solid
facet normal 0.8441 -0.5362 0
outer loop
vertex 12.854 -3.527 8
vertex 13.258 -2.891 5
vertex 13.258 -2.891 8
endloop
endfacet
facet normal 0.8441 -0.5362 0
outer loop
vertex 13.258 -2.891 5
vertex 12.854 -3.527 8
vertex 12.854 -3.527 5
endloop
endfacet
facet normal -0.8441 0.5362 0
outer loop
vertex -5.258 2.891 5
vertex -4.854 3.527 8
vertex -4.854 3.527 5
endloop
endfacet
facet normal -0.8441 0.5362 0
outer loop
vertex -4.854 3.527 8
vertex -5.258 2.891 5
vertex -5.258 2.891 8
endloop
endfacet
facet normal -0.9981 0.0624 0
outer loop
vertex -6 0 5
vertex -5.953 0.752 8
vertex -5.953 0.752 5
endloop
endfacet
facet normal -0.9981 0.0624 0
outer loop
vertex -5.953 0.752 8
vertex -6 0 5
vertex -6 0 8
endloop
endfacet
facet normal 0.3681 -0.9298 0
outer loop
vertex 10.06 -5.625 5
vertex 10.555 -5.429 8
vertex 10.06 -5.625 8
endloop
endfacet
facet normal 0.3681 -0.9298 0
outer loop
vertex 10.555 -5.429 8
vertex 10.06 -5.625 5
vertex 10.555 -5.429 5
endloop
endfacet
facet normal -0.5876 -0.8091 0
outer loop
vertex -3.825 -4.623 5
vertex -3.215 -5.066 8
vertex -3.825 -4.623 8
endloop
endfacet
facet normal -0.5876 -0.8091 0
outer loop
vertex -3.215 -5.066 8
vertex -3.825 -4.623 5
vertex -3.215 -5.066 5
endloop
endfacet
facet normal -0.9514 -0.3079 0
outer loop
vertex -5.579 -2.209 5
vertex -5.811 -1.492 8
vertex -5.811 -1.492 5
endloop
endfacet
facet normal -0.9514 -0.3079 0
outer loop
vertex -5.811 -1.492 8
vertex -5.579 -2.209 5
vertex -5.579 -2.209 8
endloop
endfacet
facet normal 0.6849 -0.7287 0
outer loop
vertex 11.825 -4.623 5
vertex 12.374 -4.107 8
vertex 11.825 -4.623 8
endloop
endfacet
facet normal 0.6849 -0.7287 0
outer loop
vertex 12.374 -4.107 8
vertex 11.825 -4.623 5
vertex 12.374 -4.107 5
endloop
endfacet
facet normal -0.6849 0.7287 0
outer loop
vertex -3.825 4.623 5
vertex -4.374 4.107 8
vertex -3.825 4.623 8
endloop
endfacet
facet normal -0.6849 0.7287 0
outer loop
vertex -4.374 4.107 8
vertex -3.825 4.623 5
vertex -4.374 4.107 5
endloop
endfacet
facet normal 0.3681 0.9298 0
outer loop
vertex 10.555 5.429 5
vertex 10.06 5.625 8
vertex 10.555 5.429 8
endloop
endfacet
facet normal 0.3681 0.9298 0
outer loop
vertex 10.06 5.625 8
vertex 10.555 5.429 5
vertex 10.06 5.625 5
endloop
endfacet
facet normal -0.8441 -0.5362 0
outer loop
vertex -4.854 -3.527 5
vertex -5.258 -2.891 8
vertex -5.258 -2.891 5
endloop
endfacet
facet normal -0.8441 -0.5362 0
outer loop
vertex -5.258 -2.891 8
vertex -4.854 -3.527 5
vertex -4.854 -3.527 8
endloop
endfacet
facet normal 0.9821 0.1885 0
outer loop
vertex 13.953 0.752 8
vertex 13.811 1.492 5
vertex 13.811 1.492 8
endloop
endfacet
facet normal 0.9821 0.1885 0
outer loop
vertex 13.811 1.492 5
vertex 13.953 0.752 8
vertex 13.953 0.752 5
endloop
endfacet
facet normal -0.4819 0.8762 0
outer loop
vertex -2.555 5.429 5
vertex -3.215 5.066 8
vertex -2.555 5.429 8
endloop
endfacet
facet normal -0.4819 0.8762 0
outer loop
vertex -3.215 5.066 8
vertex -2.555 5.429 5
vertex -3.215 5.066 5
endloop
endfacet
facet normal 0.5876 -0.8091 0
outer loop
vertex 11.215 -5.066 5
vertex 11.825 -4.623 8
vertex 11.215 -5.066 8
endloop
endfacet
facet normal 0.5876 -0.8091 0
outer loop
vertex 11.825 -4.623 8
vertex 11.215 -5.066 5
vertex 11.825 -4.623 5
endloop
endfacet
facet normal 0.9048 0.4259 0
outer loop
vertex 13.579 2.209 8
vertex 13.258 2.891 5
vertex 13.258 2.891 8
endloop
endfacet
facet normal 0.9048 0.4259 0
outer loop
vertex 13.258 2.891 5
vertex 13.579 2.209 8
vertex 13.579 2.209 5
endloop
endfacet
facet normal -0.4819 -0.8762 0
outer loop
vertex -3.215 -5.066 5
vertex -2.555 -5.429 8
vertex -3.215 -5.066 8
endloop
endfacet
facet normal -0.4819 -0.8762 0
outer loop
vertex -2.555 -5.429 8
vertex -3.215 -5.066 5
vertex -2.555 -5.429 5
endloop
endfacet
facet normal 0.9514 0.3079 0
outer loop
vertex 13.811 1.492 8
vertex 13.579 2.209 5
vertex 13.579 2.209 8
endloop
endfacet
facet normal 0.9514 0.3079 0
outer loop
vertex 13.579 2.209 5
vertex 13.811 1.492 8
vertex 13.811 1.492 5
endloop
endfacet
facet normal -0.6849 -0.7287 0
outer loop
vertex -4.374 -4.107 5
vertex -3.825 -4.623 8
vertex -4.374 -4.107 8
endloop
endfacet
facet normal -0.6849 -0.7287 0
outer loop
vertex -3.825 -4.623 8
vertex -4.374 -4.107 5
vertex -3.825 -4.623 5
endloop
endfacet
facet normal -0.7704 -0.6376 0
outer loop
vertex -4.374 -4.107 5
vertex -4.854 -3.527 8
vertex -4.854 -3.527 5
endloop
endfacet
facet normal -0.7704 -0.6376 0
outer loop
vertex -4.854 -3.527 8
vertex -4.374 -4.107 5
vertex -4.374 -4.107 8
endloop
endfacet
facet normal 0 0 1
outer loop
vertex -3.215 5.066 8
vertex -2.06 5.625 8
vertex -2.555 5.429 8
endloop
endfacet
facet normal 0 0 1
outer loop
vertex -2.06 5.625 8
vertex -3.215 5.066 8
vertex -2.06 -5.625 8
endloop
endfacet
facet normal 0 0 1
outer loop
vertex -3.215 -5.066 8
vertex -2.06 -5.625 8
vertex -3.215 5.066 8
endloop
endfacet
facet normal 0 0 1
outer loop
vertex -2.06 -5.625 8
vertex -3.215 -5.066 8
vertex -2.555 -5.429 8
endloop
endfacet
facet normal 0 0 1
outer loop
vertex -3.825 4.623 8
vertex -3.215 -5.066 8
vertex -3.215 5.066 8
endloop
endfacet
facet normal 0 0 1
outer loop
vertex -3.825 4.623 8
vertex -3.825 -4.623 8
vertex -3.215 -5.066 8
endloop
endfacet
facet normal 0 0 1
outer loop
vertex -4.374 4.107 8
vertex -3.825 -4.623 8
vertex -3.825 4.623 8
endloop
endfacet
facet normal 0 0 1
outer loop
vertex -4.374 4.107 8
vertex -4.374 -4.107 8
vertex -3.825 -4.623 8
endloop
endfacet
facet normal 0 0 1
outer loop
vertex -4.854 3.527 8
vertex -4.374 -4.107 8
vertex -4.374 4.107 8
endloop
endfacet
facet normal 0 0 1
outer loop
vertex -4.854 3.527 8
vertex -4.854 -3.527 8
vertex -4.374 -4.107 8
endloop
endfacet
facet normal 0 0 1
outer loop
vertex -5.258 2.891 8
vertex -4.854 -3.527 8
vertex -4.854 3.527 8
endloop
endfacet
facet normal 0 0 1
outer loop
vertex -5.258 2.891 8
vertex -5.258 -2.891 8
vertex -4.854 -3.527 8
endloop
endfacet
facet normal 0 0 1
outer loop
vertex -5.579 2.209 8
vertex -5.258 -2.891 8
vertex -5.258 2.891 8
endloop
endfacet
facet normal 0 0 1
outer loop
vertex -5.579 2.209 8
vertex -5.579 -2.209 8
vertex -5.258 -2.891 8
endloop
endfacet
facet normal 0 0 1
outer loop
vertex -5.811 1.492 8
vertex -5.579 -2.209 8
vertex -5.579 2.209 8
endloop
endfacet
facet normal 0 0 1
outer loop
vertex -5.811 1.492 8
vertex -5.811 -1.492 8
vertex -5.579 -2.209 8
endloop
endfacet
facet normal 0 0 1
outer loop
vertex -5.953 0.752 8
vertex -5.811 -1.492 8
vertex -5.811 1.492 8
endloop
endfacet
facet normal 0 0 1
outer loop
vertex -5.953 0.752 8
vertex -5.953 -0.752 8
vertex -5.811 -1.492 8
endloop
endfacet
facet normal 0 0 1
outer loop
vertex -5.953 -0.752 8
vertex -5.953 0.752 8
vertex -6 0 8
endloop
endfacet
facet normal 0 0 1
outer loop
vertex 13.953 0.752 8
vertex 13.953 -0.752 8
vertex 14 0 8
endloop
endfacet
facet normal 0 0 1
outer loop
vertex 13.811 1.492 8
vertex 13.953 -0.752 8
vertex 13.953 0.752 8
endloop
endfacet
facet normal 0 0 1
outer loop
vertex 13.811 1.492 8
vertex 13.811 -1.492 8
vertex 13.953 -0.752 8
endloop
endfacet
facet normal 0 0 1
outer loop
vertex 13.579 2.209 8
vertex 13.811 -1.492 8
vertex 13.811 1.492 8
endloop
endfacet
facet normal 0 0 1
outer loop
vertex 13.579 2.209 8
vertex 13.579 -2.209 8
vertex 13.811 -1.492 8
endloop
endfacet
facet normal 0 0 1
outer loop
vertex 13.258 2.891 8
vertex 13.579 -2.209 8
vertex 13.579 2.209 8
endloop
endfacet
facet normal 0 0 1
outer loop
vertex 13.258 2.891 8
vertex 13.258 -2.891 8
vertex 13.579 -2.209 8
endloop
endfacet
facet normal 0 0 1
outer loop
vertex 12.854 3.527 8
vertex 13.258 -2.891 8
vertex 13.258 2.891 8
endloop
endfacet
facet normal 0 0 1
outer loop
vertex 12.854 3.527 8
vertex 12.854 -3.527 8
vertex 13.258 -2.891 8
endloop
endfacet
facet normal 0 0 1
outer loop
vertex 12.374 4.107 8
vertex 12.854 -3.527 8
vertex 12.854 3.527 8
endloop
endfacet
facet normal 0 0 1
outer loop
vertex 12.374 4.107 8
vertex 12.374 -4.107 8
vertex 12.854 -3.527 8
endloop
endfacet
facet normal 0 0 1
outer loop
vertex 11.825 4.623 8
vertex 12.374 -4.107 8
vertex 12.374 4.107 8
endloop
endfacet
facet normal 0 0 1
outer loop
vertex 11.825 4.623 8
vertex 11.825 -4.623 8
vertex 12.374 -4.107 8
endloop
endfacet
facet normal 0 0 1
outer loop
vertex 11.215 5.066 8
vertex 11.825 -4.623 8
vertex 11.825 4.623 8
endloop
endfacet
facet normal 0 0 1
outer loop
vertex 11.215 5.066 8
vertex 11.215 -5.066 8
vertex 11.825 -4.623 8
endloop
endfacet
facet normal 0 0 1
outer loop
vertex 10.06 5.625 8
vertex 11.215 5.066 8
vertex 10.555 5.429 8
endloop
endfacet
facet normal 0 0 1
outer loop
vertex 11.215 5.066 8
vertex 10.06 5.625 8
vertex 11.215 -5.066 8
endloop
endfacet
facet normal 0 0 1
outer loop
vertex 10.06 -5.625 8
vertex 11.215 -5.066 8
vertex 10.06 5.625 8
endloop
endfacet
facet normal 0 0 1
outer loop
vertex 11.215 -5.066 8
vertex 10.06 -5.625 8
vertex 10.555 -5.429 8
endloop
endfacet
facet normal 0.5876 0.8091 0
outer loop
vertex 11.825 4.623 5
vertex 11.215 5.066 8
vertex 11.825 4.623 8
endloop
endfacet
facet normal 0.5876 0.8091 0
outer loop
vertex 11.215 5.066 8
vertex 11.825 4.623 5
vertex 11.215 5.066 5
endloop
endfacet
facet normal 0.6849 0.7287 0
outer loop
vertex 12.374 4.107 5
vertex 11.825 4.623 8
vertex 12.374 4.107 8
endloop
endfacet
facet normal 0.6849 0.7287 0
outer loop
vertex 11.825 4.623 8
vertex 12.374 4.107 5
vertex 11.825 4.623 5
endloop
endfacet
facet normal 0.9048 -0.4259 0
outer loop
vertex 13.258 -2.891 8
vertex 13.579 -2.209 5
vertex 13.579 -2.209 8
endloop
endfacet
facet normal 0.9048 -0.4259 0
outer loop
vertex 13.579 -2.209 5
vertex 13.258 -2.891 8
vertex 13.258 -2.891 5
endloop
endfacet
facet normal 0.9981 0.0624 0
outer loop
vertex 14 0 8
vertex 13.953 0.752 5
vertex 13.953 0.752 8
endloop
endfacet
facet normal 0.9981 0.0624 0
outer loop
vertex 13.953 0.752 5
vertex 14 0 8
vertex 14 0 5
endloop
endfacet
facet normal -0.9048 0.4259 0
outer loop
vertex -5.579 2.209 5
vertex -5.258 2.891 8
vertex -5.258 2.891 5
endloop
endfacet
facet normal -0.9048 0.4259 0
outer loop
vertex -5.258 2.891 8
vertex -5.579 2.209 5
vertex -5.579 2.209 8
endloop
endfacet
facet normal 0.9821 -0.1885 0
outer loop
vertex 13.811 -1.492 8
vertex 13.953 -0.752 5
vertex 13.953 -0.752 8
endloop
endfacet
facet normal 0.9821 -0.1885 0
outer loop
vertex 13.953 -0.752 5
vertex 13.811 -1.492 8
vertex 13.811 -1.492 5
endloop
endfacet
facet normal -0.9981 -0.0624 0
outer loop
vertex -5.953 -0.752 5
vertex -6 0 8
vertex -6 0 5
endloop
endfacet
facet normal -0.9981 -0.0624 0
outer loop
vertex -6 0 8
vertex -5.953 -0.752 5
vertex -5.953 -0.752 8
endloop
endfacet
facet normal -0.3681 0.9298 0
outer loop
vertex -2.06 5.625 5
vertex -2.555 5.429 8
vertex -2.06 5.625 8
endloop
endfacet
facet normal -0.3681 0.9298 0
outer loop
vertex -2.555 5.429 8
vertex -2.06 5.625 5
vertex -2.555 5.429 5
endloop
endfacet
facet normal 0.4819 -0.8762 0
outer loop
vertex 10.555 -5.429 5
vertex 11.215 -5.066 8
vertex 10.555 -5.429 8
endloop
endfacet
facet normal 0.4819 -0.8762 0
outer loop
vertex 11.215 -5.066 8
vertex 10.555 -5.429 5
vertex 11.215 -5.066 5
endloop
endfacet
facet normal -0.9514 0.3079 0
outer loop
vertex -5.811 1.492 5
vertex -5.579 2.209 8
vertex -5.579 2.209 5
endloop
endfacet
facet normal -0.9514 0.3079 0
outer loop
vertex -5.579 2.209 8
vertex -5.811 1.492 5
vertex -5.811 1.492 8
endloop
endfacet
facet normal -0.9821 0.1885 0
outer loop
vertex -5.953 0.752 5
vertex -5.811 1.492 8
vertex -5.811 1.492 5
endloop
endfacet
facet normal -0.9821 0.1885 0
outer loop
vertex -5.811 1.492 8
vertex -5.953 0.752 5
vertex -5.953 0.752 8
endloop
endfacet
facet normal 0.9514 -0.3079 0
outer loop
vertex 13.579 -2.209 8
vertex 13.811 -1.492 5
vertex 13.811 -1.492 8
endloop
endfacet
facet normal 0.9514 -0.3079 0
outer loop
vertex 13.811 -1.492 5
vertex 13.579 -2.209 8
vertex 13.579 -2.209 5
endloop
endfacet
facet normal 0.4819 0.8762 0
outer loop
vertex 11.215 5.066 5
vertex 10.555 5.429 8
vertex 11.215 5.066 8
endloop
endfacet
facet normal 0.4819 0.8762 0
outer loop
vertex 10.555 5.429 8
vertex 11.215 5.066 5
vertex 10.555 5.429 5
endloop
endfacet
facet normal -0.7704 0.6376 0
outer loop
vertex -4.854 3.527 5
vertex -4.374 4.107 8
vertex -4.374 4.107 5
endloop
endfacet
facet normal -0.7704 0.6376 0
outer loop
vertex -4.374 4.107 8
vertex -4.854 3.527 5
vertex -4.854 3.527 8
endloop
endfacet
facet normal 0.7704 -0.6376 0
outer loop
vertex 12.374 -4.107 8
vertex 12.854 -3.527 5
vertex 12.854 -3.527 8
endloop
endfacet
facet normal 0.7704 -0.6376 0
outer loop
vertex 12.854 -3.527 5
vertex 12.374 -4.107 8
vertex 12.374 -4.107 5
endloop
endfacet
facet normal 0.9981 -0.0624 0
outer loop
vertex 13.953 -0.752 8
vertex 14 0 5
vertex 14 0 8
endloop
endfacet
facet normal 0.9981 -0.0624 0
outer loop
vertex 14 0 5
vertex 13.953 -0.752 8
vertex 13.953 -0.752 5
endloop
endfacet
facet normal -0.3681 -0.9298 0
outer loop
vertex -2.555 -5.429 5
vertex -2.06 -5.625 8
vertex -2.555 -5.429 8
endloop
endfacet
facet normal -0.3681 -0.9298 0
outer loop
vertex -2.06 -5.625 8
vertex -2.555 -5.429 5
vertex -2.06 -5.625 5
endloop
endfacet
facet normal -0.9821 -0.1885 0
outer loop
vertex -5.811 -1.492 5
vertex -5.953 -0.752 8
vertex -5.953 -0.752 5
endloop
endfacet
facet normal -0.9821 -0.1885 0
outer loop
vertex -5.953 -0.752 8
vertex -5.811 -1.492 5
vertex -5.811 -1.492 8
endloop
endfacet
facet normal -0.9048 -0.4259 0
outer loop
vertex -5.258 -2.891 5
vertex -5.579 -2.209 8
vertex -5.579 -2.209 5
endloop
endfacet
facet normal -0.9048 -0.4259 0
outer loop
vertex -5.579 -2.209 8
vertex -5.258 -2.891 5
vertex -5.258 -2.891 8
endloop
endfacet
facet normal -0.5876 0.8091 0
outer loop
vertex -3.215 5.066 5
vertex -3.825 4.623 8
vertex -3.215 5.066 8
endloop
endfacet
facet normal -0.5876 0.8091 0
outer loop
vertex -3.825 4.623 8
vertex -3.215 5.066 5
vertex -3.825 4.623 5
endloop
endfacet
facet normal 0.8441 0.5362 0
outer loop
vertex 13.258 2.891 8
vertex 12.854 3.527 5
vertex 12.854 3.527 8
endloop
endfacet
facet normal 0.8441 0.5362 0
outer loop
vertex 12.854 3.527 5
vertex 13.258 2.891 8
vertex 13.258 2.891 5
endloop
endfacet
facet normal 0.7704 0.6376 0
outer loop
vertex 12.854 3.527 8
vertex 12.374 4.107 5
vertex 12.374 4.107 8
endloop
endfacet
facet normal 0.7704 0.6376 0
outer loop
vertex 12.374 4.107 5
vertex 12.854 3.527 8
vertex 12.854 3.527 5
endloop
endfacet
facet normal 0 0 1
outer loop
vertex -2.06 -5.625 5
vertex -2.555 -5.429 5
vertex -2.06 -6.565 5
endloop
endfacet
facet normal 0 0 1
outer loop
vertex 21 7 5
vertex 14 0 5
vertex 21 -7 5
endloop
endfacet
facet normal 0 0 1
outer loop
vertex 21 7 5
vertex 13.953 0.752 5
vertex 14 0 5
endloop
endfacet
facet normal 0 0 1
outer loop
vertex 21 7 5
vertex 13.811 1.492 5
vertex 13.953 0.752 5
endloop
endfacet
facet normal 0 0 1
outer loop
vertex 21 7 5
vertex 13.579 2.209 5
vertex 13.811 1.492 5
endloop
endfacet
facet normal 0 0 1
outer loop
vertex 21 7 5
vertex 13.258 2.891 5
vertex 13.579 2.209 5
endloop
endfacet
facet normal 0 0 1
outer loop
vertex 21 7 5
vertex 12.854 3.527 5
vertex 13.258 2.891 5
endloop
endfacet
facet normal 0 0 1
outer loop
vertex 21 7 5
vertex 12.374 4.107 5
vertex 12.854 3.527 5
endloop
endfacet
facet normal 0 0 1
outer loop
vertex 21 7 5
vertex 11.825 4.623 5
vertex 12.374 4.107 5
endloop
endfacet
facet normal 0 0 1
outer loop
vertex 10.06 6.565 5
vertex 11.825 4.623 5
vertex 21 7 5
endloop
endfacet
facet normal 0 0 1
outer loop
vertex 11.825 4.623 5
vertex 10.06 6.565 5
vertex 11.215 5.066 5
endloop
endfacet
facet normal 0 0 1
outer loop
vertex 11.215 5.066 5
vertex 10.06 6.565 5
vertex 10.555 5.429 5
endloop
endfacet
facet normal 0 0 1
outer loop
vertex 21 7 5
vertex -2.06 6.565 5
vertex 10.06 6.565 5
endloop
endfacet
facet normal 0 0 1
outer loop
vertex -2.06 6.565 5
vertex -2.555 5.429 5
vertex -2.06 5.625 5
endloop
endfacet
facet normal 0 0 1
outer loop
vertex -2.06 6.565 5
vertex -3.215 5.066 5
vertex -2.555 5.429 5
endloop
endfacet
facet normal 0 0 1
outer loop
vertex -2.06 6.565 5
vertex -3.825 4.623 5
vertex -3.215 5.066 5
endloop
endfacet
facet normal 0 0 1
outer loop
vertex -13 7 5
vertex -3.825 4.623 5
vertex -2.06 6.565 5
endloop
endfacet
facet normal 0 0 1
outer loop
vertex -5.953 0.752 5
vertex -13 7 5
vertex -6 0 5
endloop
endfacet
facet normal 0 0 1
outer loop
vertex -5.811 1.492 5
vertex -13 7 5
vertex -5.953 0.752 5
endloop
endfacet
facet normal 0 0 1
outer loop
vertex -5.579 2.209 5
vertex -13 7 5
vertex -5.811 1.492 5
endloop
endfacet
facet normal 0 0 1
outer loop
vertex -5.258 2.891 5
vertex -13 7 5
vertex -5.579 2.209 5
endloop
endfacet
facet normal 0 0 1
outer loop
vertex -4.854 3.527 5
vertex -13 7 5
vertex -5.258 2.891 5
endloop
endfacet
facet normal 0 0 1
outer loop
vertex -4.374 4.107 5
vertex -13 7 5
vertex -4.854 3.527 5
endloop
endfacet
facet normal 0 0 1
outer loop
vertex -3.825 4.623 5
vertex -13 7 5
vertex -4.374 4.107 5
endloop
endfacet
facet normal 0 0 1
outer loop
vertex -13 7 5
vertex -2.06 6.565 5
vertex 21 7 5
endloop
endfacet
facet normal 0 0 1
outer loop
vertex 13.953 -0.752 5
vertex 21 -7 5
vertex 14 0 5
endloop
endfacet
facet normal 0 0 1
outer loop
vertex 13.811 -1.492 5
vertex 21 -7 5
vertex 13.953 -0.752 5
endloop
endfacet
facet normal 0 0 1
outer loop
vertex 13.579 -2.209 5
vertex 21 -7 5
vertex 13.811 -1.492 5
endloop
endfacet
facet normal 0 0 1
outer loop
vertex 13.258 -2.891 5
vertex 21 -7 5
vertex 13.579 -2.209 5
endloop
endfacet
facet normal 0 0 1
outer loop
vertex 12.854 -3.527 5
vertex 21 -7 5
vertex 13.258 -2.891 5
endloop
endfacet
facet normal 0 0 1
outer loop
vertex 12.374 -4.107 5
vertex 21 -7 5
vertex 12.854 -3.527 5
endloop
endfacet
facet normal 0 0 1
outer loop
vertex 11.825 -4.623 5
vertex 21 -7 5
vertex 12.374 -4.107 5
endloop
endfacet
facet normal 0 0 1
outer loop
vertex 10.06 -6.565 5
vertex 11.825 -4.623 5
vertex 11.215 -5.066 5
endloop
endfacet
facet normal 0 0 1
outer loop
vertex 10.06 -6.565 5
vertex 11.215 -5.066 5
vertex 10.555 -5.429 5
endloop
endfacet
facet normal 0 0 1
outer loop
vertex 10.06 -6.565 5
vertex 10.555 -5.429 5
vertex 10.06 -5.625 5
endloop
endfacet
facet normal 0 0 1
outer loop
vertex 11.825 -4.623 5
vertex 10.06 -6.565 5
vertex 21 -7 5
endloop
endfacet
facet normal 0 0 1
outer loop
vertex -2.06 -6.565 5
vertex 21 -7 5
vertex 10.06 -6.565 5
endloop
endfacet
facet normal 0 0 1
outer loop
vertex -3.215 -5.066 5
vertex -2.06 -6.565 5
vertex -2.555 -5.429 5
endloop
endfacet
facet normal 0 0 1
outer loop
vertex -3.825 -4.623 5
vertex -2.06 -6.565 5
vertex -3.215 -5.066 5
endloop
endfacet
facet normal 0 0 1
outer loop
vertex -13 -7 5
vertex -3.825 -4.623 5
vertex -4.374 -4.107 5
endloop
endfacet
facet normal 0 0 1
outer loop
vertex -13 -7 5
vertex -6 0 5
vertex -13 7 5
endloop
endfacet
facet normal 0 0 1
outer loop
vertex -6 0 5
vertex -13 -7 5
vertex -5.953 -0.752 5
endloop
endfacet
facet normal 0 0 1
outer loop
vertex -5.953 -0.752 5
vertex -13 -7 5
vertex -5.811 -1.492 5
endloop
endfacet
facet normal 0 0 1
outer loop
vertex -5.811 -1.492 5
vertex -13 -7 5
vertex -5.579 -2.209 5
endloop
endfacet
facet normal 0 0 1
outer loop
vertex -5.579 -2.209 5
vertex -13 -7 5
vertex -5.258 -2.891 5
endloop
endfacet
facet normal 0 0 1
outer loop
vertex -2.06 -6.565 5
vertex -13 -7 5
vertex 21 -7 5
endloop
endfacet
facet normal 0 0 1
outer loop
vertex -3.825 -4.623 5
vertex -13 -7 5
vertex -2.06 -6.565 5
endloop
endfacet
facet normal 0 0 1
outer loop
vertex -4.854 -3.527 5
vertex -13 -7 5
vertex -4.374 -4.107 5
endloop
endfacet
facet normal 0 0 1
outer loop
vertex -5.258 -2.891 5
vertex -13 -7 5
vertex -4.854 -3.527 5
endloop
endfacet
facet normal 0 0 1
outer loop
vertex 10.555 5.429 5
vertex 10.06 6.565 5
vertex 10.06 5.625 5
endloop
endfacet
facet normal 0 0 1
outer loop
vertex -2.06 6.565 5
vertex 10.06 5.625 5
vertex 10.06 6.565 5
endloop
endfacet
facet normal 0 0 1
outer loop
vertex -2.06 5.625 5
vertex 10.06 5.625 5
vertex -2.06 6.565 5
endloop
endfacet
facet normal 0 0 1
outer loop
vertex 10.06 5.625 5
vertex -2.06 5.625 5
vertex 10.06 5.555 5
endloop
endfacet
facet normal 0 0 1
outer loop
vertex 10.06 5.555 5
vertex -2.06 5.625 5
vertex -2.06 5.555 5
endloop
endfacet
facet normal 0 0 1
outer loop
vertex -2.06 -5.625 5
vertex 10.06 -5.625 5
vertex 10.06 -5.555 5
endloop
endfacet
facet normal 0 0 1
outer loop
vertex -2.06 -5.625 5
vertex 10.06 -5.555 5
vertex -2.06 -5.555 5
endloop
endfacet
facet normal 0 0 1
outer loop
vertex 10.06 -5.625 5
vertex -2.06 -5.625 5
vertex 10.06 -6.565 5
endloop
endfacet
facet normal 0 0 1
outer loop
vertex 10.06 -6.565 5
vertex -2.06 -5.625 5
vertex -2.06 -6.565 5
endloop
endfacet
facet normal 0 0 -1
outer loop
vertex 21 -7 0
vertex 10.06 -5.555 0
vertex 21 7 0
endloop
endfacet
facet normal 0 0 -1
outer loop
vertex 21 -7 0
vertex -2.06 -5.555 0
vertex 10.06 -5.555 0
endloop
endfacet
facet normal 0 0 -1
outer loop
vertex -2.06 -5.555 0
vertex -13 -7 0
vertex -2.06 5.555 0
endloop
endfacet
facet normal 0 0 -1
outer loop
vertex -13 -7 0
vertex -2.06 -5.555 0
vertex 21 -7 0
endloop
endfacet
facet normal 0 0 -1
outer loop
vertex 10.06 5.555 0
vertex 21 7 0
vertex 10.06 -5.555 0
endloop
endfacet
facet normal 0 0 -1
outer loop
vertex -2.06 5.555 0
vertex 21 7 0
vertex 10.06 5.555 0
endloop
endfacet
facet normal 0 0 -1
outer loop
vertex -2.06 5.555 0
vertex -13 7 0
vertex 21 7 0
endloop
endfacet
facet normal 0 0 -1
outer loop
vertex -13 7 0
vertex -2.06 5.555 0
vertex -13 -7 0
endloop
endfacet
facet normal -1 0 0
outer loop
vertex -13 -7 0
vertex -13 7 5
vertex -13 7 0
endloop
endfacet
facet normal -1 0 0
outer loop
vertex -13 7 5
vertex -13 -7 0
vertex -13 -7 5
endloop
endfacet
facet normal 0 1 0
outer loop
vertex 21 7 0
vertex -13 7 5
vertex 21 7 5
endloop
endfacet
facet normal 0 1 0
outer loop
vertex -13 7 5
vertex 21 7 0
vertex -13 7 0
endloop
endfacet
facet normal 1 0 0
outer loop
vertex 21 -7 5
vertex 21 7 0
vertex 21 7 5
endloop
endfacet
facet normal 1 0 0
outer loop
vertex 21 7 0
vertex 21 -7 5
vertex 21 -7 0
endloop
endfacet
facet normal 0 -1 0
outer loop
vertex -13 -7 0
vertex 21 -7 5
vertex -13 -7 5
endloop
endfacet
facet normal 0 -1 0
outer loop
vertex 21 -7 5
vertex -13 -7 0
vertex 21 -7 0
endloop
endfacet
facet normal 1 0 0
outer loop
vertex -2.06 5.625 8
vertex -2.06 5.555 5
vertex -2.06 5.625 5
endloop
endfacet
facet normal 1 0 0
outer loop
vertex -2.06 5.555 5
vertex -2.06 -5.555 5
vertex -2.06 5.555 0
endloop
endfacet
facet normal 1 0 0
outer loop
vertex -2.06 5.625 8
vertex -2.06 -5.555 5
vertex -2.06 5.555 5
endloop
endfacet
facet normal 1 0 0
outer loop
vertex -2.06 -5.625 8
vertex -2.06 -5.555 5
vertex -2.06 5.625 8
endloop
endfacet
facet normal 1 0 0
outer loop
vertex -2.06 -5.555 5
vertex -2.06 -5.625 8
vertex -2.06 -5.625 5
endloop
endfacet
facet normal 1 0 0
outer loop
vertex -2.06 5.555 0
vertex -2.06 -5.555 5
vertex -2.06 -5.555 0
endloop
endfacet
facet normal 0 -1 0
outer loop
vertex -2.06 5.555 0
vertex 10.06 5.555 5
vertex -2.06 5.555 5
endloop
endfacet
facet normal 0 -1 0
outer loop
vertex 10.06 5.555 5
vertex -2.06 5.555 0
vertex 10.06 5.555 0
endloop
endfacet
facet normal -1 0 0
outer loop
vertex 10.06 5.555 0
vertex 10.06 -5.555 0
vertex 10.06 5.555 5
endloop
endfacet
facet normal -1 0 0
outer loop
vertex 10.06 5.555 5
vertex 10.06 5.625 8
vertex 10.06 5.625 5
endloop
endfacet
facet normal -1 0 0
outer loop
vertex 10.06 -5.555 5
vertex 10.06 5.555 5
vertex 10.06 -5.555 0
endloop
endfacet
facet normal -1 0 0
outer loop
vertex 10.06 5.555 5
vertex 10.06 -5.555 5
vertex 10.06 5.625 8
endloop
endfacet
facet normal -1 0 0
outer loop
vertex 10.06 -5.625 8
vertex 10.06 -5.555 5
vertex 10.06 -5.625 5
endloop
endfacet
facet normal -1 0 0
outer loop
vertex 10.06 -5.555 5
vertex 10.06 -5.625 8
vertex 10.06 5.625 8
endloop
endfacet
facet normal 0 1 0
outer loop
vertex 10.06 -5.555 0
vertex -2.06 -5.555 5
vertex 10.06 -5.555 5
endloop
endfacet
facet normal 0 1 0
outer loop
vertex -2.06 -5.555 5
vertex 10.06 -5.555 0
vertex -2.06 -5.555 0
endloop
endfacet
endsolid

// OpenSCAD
$fn = 50;

bottom = 5;
top = 3;


difference()
{
	union()
	{
		translate([0,0,bottom])
		linear_extrude(top)
		hull()
		{
			circle(r=6);
			translate([8, 0, 0])
			circle(r=6);
		}
		linear_extrude(bottom)
		translate([4, 0])
		square([34, 14], center=true);
	}

	linear_extrude(bottom+top+1)
	translate([4, 0])
	scale(1.01)
	square([12, 11], center=true);

	
	translate([4, 0, bottom])
	linear_extrude(top)
	scale(1.01)
	square([12, 13], center=true);
}
